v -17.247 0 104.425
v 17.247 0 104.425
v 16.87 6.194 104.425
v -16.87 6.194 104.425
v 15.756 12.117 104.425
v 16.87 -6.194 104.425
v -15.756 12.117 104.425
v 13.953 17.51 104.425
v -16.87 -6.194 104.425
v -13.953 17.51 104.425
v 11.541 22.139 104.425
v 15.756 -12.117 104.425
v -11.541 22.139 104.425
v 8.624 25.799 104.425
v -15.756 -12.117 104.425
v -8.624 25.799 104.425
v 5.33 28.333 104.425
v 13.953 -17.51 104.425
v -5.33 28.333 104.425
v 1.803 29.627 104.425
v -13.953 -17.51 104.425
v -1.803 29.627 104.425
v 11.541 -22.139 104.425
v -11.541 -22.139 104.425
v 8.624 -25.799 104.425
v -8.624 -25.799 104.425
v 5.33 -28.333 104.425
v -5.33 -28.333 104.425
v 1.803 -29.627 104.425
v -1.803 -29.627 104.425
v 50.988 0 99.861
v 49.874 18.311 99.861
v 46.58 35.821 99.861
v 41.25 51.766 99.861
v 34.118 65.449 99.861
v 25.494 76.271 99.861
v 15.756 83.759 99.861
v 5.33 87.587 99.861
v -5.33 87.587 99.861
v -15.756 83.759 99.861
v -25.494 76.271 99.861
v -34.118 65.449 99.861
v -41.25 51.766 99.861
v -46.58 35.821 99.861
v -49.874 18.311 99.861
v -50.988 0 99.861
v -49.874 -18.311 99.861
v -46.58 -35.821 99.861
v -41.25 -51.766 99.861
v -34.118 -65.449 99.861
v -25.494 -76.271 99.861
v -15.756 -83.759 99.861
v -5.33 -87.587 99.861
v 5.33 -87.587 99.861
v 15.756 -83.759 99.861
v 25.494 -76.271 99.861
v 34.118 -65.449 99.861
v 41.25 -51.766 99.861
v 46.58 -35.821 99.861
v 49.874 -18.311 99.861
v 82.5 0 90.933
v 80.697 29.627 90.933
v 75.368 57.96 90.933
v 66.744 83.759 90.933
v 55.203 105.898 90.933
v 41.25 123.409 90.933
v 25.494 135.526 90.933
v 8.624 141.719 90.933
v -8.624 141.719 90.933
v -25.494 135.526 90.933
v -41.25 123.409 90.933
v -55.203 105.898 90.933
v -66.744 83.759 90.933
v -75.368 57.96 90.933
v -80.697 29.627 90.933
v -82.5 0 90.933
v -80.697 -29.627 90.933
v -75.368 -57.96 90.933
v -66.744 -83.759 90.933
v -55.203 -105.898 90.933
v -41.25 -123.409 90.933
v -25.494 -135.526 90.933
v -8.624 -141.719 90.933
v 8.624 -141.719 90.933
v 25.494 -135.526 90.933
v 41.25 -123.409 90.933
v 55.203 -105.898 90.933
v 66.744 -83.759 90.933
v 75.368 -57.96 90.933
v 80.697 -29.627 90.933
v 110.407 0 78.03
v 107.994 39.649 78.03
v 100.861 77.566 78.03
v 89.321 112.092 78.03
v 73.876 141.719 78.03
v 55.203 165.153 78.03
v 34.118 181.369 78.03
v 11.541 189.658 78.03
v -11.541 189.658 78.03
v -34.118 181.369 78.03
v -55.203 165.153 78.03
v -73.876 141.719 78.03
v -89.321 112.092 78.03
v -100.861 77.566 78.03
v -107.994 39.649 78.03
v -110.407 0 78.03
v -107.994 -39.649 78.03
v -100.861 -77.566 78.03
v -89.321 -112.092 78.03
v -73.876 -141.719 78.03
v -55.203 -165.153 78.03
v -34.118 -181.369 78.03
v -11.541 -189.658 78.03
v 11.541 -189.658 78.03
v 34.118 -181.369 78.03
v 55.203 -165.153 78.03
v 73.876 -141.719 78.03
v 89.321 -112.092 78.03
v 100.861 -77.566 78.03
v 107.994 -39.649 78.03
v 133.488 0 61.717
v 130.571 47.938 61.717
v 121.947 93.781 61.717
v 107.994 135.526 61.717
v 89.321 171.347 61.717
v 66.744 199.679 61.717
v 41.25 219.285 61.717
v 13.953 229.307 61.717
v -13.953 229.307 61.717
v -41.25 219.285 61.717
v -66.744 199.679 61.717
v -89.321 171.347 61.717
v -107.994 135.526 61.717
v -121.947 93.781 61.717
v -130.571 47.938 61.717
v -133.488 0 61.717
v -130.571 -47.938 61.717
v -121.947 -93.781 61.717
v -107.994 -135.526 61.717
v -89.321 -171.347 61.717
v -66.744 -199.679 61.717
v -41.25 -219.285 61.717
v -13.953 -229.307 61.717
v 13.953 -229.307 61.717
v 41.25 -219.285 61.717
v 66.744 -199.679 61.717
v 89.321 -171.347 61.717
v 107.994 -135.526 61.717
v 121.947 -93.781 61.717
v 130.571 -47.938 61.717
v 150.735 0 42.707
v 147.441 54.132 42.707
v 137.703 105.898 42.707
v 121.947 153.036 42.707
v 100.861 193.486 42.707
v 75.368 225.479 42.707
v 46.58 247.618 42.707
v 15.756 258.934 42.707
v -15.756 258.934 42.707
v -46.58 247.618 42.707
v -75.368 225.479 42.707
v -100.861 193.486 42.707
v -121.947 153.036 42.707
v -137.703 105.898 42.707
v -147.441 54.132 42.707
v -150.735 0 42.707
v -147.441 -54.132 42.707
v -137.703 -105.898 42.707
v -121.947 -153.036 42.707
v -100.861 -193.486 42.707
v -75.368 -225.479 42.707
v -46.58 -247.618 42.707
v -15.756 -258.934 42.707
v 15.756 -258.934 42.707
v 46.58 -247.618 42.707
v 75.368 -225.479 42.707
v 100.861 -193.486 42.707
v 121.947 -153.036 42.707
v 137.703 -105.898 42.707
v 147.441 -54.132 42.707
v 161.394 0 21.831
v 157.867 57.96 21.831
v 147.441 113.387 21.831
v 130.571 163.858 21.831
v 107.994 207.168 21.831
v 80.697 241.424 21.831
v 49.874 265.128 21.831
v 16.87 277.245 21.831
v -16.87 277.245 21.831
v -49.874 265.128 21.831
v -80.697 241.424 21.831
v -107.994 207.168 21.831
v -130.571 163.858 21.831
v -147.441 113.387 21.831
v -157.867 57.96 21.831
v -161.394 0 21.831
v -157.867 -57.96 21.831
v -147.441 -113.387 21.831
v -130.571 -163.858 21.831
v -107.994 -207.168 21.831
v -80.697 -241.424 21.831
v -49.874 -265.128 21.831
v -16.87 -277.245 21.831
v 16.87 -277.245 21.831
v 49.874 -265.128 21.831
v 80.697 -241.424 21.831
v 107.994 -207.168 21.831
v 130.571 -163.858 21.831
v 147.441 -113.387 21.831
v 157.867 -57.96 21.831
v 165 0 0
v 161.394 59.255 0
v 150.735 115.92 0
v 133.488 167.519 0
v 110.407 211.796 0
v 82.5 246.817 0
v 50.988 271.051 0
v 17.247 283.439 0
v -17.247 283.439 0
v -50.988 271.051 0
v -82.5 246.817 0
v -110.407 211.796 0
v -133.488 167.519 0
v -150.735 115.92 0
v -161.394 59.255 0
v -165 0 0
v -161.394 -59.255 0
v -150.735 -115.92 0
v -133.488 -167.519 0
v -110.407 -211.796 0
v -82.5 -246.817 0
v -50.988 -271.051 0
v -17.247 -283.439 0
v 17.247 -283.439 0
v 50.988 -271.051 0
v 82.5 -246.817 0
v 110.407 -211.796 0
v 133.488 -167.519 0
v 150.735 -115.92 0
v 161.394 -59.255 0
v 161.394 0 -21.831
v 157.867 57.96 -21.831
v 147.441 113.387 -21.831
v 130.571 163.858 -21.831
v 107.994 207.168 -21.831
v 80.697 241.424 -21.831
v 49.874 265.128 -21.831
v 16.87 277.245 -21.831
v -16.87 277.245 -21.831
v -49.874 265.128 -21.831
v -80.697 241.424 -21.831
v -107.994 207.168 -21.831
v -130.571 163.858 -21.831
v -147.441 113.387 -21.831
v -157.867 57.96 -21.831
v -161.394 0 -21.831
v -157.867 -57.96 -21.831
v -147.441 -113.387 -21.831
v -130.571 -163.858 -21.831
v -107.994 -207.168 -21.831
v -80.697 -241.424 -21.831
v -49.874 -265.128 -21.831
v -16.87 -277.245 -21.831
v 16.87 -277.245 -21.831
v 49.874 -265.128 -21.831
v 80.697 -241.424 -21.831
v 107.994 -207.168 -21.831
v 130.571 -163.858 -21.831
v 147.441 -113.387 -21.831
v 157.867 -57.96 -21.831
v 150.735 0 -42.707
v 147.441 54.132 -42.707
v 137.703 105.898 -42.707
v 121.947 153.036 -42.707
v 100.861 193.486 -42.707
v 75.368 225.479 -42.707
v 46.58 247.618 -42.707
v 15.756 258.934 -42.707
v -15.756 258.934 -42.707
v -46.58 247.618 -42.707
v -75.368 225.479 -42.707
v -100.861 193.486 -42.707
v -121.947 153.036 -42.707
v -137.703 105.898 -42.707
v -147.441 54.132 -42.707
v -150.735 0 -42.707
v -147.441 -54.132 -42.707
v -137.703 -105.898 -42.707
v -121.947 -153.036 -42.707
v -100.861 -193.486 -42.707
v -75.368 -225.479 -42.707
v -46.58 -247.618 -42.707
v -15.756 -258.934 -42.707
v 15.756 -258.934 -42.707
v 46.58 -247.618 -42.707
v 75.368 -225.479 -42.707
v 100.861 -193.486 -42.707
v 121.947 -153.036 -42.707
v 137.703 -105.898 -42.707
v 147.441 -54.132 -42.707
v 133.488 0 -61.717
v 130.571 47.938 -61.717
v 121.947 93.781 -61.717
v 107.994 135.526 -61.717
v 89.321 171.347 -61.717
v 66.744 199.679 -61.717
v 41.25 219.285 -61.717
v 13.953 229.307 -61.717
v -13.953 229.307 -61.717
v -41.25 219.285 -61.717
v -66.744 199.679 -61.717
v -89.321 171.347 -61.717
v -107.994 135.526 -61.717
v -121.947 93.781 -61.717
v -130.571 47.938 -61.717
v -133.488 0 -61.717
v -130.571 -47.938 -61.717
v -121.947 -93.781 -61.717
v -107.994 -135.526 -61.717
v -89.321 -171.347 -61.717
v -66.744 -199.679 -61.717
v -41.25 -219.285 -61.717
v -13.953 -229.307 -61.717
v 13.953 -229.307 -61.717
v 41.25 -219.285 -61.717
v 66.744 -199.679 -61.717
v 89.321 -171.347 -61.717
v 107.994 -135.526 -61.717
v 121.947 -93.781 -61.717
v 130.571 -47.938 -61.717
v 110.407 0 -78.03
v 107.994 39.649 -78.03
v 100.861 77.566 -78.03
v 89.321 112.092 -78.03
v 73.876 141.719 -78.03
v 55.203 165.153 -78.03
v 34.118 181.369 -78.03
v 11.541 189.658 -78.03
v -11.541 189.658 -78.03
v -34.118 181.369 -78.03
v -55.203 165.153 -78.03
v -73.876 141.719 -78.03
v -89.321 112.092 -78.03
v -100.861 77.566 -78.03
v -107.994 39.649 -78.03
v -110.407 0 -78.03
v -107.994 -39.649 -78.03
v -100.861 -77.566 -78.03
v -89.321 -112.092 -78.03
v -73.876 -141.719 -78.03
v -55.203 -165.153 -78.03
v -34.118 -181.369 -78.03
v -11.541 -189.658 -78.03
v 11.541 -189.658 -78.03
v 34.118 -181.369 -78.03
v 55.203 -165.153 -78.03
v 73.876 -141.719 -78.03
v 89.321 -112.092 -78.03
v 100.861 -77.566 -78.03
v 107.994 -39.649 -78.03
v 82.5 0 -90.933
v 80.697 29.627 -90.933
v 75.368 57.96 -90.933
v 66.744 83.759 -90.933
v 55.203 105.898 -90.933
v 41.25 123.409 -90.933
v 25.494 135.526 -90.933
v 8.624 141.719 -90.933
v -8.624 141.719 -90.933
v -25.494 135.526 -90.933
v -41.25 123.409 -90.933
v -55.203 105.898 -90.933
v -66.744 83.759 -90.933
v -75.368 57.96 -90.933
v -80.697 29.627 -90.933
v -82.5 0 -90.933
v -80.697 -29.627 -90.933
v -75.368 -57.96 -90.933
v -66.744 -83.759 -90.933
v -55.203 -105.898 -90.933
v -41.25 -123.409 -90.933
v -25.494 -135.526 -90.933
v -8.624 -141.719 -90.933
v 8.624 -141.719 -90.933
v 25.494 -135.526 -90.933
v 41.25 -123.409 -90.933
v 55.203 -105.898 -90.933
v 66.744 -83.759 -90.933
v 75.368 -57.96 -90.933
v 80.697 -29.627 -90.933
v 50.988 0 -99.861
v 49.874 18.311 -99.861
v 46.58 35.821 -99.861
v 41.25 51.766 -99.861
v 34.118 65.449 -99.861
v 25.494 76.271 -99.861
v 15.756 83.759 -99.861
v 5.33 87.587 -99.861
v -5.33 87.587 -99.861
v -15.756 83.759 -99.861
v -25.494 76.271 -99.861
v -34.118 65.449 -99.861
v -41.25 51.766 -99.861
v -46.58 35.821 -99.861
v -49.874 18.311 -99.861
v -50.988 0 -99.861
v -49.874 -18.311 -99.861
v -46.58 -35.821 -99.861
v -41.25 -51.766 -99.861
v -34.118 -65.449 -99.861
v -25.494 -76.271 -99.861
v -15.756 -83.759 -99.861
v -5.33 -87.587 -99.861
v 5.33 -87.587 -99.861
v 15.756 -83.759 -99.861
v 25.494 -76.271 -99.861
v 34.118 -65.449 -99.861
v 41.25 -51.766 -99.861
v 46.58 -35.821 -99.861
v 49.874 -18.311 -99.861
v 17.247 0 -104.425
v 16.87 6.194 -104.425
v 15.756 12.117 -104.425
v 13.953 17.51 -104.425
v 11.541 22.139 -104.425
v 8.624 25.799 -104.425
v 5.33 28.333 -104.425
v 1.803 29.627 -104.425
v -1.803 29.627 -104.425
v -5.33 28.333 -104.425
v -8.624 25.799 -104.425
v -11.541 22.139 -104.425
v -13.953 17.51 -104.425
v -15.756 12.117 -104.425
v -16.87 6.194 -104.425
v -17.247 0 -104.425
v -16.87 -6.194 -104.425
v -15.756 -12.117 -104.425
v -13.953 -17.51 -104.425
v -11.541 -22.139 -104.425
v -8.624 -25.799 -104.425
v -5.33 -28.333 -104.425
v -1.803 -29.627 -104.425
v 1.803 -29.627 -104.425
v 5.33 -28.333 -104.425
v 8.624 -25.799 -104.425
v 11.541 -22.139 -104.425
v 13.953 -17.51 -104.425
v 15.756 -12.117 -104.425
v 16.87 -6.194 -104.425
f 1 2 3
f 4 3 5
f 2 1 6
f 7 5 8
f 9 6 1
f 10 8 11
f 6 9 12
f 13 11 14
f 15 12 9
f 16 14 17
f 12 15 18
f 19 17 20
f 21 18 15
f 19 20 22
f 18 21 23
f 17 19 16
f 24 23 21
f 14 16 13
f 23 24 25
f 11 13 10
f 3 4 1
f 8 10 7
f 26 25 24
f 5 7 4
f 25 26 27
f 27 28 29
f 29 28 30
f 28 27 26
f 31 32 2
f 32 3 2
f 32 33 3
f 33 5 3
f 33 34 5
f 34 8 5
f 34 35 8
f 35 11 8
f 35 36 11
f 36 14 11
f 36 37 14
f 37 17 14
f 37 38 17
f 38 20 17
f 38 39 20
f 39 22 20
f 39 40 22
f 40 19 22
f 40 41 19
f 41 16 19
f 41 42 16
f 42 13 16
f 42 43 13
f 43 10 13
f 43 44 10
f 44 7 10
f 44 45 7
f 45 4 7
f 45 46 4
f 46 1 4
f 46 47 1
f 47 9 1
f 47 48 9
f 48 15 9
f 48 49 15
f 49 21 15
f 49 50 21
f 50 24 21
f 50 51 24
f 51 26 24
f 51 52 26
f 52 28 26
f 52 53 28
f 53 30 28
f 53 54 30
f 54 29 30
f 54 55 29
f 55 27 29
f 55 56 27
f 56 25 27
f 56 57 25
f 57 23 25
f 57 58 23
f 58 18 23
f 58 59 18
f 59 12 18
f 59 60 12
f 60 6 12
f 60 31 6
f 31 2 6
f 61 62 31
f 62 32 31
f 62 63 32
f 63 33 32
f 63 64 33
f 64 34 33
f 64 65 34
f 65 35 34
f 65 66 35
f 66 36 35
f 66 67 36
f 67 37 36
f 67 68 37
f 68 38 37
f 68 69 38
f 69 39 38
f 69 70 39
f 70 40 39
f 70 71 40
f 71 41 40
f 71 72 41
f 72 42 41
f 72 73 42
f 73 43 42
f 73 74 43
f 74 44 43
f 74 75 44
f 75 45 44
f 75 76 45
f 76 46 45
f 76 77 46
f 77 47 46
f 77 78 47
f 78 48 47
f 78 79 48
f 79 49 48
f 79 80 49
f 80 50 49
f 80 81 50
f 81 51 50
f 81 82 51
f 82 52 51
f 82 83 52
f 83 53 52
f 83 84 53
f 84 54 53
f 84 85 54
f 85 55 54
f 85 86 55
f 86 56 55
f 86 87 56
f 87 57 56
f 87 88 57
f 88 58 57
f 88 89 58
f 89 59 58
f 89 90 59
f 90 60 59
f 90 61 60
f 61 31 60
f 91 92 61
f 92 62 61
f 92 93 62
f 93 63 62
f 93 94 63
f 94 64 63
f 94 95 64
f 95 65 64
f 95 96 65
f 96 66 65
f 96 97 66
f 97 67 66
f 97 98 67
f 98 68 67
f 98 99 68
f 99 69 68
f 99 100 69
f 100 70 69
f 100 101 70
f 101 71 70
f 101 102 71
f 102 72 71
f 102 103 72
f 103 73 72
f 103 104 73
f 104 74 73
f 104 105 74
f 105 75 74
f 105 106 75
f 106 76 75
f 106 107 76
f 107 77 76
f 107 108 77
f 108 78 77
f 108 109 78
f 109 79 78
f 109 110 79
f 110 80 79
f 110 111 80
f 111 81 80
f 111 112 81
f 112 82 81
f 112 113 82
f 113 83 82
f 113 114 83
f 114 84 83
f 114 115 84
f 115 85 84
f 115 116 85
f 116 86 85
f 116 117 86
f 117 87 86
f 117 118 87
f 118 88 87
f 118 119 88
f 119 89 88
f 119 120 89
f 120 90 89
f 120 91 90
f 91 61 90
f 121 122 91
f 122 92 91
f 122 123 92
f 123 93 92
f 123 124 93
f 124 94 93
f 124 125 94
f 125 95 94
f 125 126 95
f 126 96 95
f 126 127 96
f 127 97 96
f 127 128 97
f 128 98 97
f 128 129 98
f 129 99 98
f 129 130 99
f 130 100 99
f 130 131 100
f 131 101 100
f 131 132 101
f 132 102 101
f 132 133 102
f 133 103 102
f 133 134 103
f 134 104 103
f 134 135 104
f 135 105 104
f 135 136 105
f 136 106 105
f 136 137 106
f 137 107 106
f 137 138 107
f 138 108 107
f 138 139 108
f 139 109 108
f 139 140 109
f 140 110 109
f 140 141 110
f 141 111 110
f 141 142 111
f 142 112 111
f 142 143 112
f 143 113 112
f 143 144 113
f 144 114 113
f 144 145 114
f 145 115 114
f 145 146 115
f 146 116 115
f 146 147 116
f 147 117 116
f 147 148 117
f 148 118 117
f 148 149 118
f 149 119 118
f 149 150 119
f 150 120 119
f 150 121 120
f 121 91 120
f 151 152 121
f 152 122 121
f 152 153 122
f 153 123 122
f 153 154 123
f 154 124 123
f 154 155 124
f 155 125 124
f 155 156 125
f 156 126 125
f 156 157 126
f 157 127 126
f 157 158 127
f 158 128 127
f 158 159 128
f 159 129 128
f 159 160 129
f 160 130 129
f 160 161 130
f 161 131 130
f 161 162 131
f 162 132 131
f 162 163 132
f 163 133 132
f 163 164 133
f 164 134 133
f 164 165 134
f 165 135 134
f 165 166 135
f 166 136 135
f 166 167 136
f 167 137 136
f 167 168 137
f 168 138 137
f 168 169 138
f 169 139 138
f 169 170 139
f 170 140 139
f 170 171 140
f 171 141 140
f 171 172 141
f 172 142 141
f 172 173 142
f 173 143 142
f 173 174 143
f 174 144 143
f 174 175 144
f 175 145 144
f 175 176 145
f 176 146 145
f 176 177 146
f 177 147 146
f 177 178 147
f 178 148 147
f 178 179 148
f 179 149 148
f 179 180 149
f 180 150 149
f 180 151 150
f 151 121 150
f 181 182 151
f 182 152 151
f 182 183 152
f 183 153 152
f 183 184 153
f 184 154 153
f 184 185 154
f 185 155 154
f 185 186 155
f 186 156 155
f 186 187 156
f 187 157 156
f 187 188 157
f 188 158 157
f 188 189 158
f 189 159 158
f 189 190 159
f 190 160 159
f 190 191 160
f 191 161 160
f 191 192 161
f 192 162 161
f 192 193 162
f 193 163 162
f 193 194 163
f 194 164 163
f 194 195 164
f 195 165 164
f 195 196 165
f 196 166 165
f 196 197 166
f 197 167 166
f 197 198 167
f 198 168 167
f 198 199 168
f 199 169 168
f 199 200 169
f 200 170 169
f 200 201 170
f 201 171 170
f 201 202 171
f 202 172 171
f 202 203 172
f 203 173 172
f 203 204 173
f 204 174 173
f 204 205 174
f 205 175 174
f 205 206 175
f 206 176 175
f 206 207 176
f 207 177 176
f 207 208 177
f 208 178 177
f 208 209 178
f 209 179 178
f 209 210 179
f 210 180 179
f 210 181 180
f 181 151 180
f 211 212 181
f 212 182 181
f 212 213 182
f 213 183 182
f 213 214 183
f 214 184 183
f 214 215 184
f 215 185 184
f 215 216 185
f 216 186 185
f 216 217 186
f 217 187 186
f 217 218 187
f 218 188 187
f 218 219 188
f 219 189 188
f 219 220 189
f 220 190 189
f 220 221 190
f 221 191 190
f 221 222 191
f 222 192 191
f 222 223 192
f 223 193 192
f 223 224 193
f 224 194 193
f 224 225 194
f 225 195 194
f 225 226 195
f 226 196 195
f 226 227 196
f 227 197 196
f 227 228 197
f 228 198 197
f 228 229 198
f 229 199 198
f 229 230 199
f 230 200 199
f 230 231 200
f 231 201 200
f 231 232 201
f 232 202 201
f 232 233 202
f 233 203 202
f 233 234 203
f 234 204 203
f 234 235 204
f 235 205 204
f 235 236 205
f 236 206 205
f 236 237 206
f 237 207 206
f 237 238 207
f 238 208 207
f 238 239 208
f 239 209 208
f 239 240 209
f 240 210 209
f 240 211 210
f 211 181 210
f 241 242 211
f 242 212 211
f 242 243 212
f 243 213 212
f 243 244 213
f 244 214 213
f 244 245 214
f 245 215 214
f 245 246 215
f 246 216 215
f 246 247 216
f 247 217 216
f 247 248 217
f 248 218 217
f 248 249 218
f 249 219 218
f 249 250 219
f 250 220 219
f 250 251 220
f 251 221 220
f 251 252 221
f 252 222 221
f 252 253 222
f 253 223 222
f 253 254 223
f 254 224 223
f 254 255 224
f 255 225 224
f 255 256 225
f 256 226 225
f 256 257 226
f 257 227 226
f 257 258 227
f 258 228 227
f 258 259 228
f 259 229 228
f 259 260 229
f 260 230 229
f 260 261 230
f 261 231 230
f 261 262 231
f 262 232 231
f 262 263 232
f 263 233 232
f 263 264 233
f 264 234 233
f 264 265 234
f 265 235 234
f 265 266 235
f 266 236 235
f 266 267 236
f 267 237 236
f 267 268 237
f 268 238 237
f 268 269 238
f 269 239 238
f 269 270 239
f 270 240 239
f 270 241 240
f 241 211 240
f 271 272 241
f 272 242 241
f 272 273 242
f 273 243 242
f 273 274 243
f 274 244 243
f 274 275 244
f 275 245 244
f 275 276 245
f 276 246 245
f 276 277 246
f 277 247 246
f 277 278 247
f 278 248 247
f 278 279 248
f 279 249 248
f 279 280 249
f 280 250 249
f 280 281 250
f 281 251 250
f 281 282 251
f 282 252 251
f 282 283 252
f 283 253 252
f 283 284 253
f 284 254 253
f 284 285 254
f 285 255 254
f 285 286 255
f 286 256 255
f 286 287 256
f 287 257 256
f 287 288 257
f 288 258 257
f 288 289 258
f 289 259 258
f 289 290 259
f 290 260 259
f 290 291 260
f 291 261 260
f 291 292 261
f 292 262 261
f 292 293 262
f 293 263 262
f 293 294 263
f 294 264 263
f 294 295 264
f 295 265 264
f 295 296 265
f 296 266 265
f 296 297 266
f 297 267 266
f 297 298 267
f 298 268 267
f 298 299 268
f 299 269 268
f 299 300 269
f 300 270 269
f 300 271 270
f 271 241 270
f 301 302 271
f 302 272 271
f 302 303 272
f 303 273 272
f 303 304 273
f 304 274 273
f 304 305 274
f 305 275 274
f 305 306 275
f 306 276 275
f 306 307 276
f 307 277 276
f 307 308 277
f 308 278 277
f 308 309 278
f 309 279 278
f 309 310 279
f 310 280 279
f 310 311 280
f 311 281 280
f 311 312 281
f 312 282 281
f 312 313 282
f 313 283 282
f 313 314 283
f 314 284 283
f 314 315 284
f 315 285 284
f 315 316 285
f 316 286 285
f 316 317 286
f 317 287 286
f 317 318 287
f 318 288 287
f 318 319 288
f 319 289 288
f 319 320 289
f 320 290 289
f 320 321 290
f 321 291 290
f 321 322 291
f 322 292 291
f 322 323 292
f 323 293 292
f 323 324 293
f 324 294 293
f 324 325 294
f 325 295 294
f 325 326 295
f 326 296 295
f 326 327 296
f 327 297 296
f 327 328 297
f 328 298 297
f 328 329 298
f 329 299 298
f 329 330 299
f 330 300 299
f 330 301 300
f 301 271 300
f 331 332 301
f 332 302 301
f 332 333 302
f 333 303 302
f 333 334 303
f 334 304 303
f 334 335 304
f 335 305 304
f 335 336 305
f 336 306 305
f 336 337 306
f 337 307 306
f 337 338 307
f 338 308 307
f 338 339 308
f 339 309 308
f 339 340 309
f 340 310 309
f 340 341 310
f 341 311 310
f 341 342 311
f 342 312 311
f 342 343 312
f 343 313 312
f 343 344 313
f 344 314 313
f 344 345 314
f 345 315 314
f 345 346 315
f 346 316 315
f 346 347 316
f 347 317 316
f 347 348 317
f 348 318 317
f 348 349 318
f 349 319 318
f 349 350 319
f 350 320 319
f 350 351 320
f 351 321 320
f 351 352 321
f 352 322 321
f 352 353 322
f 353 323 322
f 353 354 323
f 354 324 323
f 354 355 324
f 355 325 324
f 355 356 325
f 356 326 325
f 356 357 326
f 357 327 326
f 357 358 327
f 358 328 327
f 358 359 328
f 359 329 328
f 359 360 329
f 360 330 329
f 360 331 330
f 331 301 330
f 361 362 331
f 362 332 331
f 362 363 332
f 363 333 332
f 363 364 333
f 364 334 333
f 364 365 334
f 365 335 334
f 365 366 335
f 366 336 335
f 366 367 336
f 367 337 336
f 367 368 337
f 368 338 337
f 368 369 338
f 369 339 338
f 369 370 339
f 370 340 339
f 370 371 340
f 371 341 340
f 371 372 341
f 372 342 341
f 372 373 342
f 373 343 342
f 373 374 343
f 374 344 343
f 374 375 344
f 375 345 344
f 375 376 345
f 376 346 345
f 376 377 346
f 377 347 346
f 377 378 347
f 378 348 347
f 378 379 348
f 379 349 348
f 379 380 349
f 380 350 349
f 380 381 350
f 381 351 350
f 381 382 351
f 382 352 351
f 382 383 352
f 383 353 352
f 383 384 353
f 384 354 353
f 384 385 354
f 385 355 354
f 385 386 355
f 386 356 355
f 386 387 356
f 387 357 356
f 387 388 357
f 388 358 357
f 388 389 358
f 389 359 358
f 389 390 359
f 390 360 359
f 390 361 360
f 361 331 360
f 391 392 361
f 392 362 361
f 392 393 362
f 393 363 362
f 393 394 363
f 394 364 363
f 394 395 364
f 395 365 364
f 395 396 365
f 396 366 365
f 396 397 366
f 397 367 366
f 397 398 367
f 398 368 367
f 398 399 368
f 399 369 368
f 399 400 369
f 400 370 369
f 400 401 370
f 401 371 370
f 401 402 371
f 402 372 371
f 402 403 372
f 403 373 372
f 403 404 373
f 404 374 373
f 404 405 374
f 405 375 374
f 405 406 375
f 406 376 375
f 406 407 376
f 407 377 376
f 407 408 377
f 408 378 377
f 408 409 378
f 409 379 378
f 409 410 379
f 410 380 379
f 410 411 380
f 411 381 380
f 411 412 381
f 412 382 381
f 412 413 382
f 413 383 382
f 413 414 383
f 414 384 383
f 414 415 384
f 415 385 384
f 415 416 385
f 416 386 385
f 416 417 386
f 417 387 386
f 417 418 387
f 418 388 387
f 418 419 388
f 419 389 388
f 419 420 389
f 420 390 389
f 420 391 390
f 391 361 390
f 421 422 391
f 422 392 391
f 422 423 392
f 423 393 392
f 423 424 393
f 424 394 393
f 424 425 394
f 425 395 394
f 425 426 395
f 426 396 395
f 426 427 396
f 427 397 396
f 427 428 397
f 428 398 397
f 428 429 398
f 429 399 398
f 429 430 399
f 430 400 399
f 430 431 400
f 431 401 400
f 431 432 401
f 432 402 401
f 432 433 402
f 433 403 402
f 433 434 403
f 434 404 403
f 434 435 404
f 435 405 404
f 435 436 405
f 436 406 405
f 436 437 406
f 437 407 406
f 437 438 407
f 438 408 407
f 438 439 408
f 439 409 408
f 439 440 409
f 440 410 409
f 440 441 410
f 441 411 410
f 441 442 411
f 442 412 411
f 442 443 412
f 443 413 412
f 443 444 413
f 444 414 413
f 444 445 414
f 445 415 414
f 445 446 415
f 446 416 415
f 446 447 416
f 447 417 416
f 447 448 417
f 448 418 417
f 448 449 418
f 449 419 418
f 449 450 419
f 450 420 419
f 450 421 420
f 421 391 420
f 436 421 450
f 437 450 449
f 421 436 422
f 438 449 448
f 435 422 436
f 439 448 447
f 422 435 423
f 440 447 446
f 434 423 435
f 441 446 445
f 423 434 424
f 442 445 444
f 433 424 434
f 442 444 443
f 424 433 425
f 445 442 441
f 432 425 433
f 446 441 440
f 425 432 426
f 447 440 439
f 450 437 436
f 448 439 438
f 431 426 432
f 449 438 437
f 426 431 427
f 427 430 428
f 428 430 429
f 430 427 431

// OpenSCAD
// Generated by SolidPython 1.0.1 on 2020-07-29 00:46:50


scale(v = [11, 19, 7]) {
	sphere(r = 15);
}
/***********************************************
*********      SolidPython code:      **********
************************************************
 
# import packages: SolidPython
from solid import *
from solid.utils import *
from itertools import chain, combinations, permutations


class Resize:

    def __init__(self, scad_file):
        self.scad_file = scad_file
        #self.scad_file = import_scad(scad_file)
        # cone/cylinder param:
        self.r1 = 0
        self.r2 = 0
        self.h = 0
        # rectangular prism param:
        self.w = 0
        self.l = 0
        # ellipse param:
        self.r = 0

    # import OpenScad code (file name corresponds to shape)


    # classify shape + parameters
    def assign(self, param1, param2, param3):
        if self.scad_file == 'cone.scad':
            self.r1 = param1
            self.r2 = param2
            self.h = param3
        elif self.scad_file == 'cylinder.scad':
            self.r1 = param1
            self.r2 = param2
            self.h = param3
        elif self.scad_file == 'rectangularPrism.scad':
            self.h = param1
            self.l = param2
            self.w = param3
        else:
            self.r = param1
            self.h = param2

    # resize parameters
    def iterate(self):
        x = range(3, 20, 2)
        i = 1
        if self.scad_file == 'cone.scad':
            tempList = list(permutations(x, 2))
            for temp in tempList:
                param1 = temp[0]
                param2 = temp[1]
                filepath = 'produced_scad_files/' + 'cone' + str(param1) + '_' + str(param2) + '_' + '.scad'
                scad_render_to_file(cylinder(h=param1, r1=param2, r2=0), filepath)

        elif self.scad_file == 'cylinder.scad':
            tempList = list(permutations(x, 3))
            for temp in tempList:
                param1 = temp[0]
                param2 = temp[1]
                filepath = 'produced_scad_files/' + 'cylinder' + str(param1) + '_' + str(param2) + '_' + '.scad'
                scad_render_to_file(cylinder(h=param1, r1=param2, r2=param2), filepath)

        elif self.scad_file == 'rectangularPrism.scad':
            tempList = list(permutations(x, 3))
            for temp in tempList:
                param1 = temp[0]
                param2 = temp[1]
                param3 = temp[2]
                filepath = 'produced_scad_files/' + 'rectangularPrism' + str(param1) + '_' + str(param2) + '_' + str(
                    param3) + '.scad'
                scad_render_to_file(cube(size=(param1, param2, param3)), filepath)

        elif self.scad_file == 'ellipse.scad':
            tempList = list(permutations(x, 4))
            for temp in tempList:
                param1 = temp[0]
                param2 = temp[1]
                param3 = temp[2]
                param4 = temp[3]
                filepath = 'produced_scad_files/' + 'ellipse' + str(param1) + '_' + str(param2) + '_' + str(param3) + '_' + str(param4) + '.scad'
                scad_render_to_file(scale([param1, param2, param3])(sphere(r=param4)), filepath)

    def render_to_scadfile(self):
        scad_render_to_file(scad, 'example.scad') 
 
************************************************/
